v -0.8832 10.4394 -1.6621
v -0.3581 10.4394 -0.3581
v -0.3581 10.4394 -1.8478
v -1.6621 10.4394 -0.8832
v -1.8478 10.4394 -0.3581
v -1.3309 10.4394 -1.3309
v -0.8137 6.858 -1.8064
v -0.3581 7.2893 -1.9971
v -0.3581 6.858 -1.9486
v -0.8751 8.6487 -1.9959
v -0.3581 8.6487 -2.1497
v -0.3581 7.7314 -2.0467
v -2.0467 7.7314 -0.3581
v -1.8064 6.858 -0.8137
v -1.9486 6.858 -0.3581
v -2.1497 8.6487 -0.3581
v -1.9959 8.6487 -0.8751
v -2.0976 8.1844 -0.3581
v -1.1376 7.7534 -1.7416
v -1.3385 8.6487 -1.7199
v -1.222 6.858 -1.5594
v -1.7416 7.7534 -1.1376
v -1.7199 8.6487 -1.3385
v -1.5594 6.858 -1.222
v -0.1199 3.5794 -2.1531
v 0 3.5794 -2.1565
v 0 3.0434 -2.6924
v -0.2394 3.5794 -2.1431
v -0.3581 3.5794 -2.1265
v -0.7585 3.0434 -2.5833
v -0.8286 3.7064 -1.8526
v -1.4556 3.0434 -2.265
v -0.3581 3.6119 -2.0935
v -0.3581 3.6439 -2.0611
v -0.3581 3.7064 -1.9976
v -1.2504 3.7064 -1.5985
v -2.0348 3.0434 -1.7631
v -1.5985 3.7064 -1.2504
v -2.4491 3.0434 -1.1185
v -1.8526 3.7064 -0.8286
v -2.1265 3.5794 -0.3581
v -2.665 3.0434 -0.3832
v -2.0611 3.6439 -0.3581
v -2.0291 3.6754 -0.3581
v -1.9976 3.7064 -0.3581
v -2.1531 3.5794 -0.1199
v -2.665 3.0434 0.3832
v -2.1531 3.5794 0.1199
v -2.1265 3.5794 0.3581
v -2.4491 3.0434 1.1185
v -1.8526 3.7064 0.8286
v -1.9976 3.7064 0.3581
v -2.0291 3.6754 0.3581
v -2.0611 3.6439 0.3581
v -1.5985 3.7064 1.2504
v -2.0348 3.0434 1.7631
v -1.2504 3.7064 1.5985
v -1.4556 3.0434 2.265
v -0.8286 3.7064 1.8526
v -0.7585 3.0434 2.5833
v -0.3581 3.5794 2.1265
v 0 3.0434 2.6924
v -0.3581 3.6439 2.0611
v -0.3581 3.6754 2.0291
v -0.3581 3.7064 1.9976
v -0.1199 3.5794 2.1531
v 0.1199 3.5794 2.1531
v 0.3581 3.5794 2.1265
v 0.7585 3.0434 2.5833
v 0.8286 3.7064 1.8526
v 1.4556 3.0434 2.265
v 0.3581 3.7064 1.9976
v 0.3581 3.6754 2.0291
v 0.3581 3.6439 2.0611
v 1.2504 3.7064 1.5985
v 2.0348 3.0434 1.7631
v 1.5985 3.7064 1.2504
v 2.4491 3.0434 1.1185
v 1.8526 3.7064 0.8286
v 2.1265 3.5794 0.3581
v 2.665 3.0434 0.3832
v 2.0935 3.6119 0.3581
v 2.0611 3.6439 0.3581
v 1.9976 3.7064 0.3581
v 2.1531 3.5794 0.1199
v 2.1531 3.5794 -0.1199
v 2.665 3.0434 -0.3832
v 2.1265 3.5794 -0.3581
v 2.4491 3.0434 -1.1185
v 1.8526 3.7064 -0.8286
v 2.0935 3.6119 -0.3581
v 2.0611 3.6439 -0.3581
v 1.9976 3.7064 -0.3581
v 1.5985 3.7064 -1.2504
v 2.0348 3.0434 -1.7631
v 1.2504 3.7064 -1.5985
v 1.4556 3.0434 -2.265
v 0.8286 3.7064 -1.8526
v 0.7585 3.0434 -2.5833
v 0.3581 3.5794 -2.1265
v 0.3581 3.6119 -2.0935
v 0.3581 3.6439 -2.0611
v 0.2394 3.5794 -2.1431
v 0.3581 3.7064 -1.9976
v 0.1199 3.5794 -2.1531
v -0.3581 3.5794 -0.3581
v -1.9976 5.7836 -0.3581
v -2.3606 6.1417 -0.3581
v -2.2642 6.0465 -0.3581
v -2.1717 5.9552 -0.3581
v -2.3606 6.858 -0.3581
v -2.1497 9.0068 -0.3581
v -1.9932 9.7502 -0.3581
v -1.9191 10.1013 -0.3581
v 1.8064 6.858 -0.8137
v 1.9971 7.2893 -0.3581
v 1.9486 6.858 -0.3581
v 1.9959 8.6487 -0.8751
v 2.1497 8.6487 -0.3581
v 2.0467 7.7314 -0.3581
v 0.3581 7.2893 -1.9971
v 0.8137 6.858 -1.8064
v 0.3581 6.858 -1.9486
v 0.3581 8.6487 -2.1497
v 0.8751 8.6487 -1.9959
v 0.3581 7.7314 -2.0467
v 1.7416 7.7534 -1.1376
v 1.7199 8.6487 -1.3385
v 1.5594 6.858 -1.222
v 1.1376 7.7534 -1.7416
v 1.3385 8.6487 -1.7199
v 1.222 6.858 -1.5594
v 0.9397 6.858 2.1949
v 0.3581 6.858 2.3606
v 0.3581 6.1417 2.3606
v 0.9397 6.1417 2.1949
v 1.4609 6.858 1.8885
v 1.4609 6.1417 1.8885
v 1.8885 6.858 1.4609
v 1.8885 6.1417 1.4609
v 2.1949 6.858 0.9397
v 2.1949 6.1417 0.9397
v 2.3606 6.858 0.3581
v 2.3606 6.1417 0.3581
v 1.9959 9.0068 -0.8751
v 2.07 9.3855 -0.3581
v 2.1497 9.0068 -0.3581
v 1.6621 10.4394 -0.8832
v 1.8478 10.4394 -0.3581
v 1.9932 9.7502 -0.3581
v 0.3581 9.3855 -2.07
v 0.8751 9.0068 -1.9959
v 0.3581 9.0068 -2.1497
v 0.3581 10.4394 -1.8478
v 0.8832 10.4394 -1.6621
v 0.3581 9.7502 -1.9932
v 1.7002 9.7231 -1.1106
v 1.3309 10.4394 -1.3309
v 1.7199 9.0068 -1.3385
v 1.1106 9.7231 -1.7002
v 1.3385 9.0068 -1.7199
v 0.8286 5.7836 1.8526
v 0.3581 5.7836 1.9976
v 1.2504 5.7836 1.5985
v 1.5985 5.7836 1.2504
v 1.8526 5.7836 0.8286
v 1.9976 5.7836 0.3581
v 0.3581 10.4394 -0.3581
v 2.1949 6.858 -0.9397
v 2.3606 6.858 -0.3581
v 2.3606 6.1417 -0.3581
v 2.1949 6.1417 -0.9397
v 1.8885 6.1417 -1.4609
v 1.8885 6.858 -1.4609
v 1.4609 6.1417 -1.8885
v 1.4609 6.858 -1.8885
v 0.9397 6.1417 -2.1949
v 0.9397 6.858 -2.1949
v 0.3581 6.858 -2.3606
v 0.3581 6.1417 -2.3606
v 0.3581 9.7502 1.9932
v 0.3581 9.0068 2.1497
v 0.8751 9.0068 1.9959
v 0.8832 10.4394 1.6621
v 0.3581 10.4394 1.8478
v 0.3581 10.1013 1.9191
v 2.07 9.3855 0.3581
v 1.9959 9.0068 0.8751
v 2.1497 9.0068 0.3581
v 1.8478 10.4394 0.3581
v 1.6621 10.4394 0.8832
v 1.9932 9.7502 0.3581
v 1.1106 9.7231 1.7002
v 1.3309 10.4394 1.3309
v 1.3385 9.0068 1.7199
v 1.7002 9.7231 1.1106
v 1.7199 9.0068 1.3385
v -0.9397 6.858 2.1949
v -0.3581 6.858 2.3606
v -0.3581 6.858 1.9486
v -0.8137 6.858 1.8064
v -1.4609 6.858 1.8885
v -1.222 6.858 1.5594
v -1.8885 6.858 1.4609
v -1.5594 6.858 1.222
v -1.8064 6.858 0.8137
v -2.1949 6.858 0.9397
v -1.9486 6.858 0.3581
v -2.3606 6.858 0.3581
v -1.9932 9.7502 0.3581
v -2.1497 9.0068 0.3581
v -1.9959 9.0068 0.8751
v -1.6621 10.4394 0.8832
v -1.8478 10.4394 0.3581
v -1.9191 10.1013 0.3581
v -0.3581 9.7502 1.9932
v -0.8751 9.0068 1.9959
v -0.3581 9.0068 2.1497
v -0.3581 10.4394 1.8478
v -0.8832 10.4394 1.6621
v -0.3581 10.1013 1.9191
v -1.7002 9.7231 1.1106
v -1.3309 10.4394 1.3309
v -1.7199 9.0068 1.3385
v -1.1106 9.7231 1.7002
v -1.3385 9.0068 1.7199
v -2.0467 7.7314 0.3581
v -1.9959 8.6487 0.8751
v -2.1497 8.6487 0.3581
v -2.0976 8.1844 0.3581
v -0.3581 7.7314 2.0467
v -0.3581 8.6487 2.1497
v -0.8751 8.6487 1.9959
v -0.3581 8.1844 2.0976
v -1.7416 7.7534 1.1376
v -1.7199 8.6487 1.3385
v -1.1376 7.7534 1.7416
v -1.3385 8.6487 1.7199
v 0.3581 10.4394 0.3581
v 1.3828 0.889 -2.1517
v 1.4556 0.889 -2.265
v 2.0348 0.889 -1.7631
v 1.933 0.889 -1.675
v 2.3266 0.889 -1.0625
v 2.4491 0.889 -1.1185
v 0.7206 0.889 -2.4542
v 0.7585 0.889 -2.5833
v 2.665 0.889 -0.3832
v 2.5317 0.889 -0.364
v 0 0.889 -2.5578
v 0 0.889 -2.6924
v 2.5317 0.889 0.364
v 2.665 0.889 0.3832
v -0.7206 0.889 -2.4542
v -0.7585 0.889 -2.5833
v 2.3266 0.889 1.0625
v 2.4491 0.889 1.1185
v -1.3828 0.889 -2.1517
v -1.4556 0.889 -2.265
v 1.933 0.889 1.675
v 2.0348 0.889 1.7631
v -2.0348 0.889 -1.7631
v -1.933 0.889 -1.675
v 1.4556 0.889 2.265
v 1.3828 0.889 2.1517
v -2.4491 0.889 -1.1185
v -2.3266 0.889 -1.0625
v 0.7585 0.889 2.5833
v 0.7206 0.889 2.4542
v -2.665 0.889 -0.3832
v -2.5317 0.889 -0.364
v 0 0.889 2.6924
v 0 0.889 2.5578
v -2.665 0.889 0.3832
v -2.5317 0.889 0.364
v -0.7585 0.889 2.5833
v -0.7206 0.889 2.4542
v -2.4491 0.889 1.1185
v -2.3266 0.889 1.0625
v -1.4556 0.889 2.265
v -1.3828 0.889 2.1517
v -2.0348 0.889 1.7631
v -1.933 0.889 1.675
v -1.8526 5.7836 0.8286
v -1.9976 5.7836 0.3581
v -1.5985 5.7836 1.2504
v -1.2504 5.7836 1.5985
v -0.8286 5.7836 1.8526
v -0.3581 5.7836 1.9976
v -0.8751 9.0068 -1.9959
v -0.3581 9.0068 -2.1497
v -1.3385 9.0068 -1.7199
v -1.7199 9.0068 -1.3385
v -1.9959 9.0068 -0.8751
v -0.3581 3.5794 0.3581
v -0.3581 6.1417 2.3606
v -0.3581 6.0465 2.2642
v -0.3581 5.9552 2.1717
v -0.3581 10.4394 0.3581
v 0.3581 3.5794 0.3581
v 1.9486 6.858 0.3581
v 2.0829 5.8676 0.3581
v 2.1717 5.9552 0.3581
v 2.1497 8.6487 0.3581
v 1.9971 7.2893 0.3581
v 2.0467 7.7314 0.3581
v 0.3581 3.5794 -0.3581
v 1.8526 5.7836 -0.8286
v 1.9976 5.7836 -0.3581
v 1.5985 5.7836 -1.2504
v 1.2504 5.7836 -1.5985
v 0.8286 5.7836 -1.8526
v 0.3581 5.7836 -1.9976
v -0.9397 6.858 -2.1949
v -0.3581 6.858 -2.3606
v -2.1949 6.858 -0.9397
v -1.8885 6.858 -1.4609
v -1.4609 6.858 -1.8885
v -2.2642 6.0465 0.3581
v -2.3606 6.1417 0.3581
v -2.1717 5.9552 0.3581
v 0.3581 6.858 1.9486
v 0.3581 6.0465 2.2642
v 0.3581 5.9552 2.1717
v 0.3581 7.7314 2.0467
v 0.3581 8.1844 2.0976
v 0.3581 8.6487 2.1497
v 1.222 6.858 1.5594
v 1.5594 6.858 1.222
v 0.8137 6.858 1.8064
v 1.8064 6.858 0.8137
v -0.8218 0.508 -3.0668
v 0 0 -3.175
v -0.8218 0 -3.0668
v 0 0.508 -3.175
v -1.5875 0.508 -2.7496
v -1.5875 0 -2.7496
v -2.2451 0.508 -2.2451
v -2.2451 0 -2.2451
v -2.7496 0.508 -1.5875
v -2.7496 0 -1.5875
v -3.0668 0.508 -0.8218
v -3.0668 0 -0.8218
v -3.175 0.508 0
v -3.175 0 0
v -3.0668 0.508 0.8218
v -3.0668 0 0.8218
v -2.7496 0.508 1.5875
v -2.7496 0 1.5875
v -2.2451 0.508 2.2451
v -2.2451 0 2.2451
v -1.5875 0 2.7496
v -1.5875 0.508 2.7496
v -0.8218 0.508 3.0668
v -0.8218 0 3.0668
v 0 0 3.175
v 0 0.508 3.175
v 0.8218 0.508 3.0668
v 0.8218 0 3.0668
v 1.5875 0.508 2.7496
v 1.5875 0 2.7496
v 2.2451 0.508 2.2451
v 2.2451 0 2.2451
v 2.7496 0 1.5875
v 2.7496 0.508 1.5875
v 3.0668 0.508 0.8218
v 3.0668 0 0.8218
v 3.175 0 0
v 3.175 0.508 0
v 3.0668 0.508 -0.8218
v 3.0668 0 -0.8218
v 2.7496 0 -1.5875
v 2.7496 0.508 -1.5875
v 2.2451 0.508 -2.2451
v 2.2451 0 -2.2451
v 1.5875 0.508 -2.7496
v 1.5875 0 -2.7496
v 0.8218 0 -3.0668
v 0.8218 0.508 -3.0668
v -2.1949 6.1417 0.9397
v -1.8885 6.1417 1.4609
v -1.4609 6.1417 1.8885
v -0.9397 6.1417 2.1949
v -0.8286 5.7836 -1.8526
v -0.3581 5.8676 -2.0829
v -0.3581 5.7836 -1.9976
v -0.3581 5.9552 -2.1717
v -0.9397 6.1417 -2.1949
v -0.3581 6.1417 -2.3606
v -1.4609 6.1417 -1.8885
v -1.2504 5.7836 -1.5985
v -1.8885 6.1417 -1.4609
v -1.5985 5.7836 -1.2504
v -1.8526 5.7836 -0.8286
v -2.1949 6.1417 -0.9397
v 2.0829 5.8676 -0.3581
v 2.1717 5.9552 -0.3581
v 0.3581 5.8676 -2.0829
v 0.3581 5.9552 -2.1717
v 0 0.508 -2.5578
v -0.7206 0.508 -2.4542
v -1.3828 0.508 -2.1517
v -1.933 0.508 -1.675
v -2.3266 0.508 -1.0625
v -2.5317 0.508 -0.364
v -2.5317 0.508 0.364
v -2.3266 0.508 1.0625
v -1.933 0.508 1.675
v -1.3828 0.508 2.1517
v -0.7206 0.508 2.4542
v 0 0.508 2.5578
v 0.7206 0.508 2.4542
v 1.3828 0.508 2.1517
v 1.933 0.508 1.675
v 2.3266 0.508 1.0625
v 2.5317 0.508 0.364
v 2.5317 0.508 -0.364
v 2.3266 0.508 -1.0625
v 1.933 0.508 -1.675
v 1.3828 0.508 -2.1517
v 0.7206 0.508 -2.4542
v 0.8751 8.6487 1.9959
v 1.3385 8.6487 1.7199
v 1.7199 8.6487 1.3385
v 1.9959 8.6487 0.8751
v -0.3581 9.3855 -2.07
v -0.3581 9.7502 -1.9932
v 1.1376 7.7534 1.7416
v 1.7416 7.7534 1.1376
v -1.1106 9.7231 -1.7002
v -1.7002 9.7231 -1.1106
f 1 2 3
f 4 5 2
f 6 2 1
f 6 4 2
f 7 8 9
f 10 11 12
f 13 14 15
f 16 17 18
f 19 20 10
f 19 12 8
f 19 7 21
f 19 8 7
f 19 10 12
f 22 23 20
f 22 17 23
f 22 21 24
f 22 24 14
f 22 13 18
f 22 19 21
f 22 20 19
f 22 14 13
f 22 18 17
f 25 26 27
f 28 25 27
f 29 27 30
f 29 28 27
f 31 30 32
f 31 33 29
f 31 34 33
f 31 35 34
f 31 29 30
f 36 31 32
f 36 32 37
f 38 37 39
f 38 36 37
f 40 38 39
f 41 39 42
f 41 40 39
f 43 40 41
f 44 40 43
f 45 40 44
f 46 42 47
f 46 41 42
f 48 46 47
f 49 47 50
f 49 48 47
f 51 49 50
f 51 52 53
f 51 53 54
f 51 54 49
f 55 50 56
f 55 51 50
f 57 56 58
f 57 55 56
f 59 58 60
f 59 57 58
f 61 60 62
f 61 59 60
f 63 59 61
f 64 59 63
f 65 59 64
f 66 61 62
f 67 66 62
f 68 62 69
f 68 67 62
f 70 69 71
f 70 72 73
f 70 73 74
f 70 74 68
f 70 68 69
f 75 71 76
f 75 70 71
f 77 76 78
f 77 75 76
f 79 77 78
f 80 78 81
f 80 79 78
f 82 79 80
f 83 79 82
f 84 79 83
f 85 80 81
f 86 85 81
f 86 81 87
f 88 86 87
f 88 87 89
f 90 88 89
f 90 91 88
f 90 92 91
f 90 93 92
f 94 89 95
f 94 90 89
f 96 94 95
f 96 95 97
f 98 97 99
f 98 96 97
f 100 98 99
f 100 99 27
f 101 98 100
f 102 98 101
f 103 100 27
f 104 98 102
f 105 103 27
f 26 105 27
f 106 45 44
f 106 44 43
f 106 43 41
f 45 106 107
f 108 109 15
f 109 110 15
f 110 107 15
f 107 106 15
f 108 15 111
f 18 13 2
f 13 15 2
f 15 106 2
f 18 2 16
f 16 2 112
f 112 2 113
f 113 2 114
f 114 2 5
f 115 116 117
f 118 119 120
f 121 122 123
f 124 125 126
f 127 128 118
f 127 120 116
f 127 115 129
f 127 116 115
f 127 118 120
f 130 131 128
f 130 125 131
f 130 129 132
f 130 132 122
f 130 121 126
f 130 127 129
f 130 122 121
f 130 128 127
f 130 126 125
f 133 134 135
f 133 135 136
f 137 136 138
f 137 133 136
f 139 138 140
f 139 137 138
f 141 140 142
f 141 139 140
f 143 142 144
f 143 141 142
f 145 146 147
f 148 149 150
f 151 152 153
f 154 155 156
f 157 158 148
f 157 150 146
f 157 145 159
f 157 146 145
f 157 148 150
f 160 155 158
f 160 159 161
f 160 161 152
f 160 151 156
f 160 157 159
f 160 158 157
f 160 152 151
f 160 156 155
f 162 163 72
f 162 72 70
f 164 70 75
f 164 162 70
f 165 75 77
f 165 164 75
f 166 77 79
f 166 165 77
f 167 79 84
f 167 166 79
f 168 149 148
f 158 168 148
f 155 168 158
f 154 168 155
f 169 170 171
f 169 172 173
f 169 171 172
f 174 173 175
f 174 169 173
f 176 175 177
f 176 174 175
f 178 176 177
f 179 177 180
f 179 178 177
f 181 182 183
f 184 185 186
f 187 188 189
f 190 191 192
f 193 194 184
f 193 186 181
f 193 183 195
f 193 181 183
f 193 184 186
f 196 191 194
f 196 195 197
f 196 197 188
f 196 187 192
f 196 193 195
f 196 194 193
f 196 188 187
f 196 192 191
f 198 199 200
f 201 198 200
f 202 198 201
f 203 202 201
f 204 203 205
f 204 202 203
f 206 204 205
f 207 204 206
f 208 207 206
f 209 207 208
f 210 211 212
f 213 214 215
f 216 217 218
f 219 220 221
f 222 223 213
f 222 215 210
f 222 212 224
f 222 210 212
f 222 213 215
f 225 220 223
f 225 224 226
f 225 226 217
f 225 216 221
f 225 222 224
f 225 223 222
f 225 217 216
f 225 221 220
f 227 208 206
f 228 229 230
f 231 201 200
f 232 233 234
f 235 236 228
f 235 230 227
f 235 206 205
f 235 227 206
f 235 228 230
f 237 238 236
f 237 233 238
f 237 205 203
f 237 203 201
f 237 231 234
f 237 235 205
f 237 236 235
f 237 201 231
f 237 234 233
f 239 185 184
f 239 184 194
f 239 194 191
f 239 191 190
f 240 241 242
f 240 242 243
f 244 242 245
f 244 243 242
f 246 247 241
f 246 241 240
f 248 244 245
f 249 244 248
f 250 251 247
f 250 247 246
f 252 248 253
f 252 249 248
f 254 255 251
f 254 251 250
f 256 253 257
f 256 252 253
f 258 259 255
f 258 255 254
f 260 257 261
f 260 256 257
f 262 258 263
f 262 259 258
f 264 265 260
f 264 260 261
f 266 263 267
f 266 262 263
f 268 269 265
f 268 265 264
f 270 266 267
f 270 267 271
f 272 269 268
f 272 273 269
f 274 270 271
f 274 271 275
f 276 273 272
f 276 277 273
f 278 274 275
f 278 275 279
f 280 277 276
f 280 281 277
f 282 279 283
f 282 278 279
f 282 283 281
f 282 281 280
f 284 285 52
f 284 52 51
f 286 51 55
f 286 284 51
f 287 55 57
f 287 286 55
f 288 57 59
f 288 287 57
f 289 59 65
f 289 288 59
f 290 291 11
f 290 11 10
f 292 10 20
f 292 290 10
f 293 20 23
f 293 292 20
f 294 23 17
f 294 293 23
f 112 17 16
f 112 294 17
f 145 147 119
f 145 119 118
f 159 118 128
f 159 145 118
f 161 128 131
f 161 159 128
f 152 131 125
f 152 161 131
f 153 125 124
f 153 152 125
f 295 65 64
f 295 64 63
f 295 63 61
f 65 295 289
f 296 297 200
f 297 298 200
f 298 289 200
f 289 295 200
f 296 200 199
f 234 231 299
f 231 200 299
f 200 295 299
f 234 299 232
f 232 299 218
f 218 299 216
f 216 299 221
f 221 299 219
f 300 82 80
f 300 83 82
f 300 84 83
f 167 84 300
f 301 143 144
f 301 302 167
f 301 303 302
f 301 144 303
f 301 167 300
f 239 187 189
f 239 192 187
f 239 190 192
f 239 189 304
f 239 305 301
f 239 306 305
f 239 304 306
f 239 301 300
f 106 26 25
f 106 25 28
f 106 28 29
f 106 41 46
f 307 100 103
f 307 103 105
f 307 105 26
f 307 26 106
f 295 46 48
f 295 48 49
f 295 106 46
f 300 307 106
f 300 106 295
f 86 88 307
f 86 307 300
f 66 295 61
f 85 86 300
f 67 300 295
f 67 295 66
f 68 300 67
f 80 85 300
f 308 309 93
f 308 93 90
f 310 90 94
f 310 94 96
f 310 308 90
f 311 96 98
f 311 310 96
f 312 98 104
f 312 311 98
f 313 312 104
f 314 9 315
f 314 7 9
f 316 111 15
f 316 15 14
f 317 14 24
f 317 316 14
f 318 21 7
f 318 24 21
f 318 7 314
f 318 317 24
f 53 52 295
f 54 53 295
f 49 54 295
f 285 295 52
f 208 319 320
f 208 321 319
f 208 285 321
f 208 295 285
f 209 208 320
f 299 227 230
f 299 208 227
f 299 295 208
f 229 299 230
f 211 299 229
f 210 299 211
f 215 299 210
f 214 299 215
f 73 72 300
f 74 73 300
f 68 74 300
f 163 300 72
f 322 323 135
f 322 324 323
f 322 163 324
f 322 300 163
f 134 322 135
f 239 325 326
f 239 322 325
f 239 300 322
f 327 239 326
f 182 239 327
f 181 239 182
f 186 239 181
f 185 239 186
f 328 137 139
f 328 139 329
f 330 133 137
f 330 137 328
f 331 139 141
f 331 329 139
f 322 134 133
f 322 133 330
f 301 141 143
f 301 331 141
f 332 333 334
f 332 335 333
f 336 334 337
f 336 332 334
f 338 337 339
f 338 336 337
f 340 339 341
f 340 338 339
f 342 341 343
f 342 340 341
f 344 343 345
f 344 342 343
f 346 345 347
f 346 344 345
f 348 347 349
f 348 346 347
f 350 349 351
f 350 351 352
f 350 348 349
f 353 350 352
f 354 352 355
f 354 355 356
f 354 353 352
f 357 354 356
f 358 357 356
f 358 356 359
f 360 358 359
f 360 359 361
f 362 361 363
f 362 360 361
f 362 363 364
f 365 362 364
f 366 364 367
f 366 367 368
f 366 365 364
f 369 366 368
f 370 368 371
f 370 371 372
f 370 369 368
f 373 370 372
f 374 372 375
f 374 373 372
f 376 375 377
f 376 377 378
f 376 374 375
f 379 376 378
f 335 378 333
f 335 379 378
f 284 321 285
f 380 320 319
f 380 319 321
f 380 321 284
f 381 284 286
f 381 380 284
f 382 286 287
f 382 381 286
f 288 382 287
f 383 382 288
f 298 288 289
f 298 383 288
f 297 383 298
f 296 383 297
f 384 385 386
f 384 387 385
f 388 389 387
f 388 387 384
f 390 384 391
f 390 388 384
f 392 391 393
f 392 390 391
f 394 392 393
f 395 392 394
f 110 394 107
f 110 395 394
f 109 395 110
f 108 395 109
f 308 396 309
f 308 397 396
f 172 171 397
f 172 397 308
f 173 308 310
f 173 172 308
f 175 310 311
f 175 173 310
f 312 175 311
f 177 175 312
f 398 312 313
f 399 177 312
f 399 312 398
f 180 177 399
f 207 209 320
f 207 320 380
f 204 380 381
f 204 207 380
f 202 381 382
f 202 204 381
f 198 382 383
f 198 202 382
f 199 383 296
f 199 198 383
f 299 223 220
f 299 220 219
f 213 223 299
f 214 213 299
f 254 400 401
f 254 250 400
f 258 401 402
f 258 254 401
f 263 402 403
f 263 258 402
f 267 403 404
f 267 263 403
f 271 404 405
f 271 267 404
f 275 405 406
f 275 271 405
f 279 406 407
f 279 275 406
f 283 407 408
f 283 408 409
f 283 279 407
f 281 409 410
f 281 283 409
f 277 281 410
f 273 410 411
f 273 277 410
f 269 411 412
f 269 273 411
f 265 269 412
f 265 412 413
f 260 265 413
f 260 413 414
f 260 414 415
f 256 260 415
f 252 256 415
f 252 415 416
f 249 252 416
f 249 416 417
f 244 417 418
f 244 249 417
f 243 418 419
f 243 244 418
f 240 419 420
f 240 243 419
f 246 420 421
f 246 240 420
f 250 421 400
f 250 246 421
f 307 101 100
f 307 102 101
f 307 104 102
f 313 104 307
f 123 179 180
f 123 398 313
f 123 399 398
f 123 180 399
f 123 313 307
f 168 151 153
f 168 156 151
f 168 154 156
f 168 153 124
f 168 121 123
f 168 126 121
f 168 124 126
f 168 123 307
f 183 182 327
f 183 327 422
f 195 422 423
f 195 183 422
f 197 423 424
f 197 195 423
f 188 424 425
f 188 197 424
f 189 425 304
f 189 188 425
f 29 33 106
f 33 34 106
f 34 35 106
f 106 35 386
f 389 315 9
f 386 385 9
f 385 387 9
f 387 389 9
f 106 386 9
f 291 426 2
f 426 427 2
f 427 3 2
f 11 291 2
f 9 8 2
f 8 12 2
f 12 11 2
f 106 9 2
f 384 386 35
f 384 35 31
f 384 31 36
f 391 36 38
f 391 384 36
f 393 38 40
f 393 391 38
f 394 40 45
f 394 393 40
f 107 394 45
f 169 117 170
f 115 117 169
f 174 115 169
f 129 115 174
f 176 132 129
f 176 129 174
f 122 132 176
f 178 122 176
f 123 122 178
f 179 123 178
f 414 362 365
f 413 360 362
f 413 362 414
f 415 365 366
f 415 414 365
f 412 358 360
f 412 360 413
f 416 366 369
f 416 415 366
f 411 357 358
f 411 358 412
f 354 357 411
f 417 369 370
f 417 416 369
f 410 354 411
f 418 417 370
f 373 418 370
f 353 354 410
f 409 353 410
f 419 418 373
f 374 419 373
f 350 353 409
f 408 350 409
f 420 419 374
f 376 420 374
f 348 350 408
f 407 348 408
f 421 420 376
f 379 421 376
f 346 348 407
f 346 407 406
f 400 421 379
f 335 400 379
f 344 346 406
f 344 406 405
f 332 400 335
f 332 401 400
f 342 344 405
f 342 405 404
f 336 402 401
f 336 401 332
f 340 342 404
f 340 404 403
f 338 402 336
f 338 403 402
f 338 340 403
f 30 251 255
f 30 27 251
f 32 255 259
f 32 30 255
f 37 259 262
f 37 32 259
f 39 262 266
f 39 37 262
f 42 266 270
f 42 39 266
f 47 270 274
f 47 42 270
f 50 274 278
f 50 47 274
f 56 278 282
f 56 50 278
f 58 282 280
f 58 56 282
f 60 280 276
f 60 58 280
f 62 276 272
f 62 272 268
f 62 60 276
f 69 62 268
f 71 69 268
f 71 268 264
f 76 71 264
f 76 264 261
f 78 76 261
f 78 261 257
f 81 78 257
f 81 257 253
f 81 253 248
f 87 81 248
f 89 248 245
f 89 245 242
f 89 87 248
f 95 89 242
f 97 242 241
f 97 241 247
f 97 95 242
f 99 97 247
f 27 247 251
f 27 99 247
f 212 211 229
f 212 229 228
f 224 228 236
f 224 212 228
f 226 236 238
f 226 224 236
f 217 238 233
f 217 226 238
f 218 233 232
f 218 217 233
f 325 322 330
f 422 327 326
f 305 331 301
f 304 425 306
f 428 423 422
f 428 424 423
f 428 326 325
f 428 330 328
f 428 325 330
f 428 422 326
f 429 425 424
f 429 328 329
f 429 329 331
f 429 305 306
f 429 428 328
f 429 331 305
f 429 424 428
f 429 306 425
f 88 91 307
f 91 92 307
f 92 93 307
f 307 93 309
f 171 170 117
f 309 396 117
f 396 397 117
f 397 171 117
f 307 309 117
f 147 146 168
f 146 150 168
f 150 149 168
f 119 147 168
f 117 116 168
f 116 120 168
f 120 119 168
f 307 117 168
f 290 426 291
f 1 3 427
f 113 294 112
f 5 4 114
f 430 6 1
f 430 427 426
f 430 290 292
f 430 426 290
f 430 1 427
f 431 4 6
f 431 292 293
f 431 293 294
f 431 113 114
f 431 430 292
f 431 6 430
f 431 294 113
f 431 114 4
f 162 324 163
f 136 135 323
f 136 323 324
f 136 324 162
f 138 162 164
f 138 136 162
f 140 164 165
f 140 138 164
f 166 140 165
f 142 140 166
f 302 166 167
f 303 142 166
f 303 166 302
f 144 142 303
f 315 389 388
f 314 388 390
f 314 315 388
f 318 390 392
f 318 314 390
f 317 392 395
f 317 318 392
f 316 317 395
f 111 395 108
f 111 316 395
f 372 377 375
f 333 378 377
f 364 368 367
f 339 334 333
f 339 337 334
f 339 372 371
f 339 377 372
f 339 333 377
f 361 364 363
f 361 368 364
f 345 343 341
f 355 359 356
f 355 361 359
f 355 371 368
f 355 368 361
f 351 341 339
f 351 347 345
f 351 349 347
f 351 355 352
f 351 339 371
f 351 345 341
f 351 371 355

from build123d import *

# Parameters (mm, degrees)
SLITCUTSKE_W     = 5.336948004
SLITCUTSKE_H     = 0.71628
SLITCUT_DEPTH    = 6.860032
SLITCUTPAT_COUNT = 2
SLITCUTPAT_ANGLE = 90


with BuildPart() as part:
    # BodySke → Body (revolve)
    with BuildSketch(Plane.XY, mode=Mode.PRIVATE) as body_sk:
        Polygon((2.55778, 0.508), (2.55778, 0.889), (2.6924, 0.889), (2.6924, 3.043428), (2.02946, 3.706368), (2.02946, 5.78358), (2.3876, 6.14172), (2.3876, 6.858), (1.9812, 6.858), (2.17932, 8.6487), (2.17932, 9.00684), (1.88214, 10.4394), (0, 10.4394), (0, 0), (3.175, 0), (3.175, 0.508), align=None)
    revolve(body_sk.sketch.rotate(Axis((0, 0, 0), (0, 1, 0)), 90), axis=Axis((0, 0, 0), (0, 1, 0)))

    # SlitCutSke → SlitCut (cut)
    with BuildSketch(Plane(origin=(0, 10.4394, 0), x_dir=(-1, 0, 0), z_dir=(0, 1, 0))):
        Rectangle(SLITCUTSKE_W, SLITCUTSKE_H)
    slitcut = extrude(amount=-SLITCUT_DEPTH, mode=Mode.SUBTRACT)

    # SlitCutPat: SlitCut ×2 about axis
    slitcutpat_axis = Axis((0, 0, 0), (0, 1, 0))
    for i in range(1, SLITCUTPAT_COUNT):
        add(slitcut.rotate(slitcutpat_axis, i * SLITCUTPAT_ANGLE / (SLITCUTPAT_COUNT - 1)), mode=Mode.SUBTRACT)


solid = part.part
